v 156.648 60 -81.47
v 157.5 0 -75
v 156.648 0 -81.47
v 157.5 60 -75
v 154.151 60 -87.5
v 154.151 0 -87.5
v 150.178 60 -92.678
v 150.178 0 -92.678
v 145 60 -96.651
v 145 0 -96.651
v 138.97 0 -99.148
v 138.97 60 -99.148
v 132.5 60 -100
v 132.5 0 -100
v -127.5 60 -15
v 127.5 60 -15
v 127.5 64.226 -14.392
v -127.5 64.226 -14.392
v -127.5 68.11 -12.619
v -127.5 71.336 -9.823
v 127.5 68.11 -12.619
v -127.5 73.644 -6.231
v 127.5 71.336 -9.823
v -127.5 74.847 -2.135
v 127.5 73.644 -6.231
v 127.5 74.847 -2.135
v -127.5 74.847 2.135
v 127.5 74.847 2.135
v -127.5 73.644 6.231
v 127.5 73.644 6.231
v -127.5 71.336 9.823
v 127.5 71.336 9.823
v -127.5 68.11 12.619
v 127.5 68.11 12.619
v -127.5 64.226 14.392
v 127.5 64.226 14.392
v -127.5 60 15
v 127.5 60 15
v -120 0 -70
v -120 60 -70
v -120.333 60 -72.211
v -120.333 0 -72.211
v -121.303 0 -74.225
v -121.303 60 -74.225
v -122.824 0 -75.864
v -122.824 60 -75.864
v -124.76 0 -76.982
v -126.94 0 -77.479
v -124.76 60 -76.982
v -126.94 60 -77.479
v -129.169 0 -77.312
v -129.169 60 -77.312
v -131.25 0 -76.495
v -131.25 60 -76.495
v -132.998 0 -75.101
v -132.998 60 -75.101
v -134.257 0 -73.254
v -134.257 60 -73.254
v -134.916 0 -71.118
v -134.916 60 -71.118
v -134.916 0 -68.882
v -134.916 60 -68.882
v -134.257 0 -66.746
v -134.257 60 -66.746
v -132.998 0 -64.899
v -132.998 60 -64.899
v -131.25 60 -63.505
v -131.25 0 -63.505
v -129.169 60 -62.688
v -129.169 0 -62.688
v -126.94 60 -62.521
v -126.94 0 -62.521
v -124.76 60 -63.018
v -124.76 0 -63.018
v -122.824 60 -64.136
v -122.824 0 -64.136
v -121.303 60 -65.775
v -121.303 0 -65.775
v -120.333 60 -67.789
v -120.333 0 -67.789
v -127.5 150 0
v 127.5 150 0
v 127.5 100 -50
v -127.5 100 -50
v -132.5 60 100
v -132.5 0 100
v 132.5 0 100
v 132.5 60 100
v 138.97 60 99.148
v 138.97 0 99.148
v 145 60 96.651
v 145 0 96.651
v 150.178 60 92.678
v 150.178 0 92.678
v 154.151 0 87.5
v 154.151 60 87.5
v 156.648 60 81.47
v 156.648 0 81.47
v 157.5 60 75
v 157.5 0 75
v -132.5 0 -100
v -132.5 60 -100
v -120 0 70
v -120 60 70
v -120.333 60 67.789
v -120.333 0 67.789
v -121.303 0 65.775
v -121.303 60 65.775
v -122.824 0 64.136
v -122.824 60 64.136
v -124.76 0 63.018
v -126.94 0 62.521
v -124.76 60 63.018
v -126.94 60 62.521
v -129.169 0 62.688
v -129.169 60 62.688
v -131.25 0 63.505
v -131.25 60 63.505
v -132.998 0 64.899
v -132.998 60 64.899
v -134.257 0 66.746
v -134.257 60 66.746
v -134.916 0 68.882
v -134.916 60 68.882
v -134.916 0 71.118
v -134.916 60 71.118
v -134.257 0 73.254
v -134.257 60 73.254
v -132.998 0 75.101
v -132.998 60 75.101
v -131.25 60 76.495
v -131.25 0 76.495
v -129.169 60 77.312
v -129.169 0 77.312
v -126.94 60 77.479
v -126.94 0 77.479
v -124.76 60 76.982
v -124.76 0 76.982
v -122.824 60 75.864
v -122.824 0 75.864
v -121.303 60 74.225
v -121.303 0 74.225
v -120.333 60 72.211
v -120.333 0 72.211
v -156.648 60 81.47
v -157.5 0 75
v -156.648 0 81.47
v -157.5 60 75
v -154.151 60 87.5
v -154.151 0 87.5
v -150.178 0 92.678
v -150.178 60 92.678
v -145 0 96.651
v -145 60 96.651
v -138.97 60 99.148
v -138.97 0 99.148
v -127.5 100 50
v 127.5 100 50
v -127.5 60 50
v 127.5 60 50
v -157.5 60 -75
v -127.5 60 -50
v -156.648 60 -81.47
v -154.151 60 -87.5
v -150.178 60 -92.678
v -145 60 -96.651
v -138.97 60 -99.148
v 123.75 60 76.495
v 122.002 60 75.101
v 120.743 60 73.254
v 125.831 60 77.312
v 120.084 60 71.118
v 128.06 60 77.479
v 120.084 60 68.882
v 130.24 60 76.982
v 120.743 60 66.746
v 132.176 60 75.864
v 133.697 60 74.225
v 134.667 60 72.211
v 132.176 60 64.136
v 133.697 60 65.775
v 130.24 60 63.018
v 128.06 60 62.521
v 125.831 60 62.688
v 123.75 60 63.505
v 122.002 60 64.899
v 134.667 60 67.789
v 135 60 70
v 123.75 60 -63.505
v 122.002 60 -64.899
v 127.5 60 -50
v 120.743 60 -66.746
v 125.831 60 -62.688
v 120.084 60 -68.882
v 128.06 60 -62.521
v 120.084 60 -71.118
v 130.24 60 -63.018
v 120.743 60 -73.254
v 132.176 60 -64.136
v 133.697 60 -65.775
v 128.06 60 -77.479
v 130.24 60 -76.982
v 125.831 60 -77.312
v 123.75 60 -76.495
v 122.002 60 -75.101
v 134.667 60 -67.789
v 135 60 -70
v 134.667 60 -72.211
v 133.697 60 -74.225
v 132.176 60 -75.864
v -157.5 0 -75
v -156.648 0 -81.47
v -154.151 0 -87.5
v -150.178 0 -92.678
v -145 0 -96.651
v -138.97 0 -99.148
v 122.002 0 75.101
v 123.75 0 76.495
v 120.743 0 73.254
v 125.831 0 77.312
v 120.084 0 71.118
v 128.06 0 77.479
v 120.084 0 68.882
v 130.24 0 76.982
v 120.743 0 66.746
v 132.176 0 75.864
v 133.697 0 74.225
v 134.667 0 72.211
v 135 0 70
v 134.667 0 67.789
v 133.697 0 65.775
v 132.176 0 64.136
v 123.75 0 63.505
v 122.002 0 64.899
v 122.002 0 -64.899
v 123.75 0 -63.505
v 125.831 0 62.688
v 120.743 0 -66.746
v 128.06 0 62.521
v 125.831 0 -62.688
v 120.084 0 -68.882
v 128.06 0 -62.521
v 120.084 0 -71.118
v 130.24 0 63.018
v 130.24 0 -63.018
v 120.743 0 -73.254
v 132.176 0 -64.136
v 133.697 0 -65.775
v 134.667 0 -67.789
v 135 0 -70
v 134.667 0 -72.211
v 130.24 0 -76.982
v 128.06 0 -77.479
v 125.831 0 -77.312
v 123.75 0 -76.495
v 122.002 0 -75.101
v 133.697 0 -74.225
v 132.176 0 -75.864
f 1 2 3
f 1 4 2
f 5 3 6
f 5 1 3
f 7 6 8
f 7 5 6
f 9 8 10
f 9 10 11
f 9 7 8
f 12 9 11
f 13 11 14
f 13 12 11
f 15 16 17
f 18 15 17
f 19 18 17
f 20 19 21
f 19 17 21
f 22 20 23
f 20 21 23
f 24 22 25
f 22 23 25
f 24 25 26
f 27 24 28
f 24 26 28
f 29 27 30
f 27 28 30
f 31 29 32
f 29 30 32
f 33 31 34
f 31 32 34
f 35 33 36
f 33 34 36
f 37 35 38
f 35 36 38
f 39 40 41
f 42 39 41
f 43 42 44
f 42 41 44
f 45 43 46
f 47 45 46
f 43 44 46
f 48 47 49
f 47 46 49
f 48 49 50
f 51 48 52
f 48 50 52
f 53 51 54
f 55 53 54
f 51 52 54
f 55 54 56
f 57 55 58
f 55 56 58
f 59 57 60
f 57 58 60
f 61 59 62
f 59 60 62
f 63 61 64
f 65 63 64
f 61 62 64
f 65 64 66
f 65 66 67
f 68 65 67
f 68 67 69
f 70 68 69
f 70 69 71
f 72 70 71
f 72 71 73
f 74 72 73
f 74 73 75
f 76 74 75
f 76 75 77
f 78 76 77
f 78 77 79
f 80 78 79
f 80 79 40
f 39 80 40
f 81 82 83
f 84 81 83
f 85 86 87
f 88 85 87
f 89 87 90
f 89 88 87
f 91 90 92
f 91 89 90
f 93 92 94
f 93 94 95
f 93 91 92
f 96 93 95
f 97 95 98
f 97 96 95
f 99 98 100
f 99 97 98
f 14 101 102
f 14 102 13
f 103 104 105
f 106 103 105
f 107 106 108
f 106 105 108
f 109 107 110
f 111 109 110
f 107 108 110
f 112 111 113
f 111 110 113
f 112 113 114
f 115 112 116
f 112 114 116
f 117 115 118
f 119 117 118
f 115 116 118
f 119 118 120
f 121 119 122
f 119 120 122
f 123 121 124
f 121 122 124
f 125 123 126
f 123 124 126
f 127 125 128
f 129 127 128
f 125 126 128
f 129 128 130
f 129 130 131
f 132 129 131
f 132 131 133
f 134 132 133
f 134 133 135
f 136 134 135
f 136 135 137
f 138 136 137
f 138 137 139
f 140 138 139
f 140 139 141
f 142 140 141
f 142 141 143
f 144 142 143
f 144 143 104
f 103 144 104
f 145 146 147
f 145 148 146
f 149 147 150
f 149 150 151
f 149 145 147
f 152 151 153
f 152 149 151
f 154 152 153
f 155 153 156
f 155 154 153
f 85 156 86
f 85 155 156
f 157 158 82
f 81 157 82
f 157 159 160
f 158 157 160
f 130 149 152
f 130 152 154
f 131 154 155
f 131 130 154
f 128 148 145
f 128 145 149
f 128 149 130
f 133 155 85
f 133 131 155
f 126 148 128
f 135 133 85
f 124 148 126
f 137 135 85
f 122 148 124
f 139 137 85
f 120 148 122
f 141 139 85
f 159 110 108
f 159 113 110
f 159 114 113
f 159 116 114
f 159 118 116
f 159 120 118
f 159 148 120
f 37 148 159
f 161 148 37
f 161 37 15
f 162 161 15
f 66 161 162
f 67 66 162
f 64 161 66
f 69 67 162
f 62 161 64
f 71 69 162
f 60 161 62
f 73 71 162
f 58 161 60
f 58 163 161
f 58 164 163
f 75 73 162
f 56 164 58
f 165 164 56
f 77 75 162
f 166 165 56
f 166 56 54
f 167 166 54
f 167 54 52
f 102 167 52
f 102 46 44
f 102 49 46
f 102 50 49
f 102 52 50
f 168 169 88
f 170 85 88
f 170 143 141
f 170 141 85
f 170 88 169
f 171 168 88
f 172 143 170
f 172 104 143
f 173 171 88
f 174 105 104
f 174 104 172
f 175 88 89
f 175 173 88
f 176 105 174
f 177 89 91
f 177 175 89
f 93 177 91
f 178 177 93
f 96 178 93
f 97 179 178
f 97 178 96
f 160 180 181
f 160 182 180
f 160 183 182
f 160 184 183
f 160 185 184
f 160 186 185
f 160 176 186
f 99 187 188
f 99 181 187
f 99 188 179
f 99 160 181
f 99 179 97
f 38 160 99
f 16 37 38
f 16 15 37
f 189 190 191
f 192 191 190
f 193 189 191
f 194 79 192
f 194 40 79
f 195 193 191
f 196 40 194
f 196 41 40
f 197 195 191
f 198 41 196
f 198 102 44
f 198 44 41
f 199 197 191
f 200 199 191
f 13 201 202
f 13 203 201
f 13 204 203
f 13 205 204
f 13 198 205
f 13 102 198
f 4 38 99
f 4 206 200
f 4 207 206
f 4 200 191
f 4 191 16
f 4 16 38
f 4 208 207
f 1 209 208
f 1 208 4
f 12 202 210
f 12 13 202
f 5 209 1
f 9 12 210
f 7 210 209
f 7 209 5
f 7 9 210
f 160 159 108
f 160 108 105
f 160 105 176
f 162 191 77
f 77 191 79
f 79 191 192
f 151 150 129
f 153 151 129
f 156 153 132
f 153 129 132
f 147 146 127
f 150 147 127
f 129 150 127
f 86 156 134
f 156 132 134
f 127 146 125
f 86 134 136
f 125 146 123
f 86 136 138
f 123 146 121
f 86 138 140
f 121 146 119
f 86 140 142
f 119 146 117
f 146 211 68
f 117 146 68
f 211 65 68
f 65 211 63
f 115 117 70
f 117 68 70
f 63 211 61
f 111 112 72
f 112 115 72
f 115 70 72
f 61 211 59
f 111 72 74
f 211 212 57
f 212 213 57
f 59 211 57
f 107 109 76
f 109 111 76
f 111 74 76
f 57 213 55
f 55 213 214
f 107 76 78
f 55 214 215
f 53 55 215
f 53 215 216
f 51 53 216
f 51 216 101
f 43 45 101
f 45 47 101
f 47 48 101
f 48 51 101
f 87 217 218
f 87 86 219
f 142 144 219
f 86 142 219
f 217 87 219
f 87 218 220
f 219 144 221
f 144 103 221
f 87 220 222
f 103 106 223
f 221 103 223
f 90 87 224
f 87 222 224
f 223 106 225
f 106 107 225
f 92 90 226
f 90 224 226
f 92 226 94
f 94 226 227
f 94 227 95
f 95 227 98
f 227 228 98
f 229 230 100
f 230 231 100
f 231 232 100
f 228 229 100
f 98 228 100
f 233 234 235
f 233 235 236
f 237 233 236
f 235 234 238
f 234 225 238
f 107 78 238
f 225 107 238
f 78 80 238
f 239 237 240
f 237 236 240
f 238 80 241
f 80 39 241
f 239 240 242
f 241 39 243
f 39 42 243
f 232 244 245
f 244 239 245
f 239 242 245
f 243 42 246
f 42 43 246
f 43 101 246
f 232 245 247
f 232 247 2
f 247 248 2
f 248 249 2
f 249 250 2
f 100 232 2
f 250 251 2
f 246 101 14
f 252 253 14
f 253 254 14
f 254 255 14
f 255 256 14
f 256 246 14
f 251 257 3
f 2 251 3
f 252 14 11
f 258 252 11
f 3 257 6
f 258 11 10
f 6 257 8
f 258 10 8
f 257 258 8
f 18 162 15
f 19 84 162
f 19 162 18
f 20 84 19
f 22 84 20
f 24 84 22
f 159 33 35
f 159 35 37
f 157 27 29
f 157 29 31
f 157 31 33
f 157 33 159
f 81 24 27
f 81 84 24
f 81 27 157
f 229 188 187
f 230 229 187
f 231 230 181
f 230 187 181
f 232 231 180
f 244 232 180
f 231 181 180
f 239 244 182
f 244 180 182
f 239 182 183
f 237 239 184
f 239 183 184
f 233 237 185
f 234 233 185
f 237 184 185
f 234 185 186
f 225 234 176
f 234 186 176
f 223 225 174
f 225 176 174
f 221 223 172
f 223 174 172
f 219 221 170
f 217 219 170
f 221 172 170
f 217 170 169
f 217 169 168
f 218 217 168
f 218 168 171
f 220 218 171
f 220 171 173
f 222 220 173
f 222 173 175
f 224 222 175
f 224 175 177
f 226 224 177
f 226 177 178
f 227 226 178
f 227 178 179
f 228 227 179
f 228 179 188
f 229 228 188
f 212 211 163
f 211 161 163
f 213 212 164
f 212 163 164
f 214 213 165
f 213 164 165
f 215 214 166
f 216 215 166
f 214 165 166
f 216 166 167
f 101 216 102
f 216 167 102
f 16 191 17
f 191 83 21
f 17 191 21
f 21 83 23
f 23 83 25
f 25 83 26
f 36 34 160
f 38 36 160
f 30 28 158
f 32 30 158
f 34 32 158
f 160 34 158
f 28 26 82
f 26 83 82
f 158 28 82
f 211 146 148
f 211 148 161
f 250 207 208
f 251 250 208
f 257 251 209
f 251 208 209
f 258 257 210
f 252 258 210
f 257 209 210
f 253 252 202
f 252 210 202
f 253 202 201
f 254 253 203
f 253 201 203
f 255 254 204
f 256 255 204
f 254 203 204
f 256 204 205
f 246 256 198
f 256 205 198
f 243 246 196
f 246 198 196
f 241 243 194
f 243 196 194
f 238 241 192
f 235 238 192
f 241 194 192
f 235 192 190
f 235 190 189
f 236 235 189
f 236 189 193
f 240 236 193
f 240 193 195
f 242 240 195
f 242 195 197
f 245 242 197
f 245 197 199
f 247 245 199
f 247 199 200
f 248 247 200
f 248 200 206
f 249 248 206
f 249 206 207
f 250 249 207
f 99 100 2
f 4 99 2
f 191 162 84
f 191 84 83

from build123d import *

# Parameters (mm, degrees)
IZIM1_W                     = 315
IZIM1_H                     = 200
Y_KSEKLIK_EKSTR_ZYON1_DEPTH = 60
RADYUS1_R                   = 25
IZIM2_R                     = 7.5
KES_EKSTR_ZYON1_DEPTH       = 61
IZIM3_W                     = 255
IZIM3_H                     = 100
Y_KSEKLIK_EKSTR_ZYON2_DEPTH = 40
Y_KSEKLIK_EKSTR_ZYON3_DEPTH = 255
KES_EKSTR_ZYON2_DEPTH       = 286


with BuildPart() as part:
    # Çizim1 → Yükseklik-Ekstrüzyon1 (new body)
    with BuildSketch(Plane(origin=(0, 0, 0), x_dir=(1, 0, 0), z_dir=(0, 1, 0))):
        Rectangle(IZIM1_W, IZIM1_H)
    extrude(amount=Y_KSEKLIK_EKSTR_ZYON1_DEPTH)

    # Radyus1
    radyus1_edges = [part.edges().sort_by_distance(p)[0] for p in [
        (157.5, 30, 100),
        (-157.5, 30, 100),
        (-157.5, 30, -100),
        (157.5, 30, -100),
    ]]
    fillet(radyus1_edges, radius=RADYUS1_R)

    # Çizim2 → Kes-Ekstrüzyon1 (cut, through all)
    with BuildSketch(Plane(origin=(0, 60, 0), x_dir=(1, 0, 0), z_dir=(0, 1, 0))):
        with Locations((-127.5, 70)):
            Circle(IZIM2_R)
        with Locations((127.5, 70)):
            Circle(IZIM2_R)
        with Locations((127.5, -70)):
            Circle(IZIM2_R)
        with Locations((-127.5, -70)):
            Circle(IZIM2_R)
    extrude(amount=-KES_EKSTR_ZYON1_DEPTH, mode=Mode.SUBTRACT)

    # Çizim3 → Yükseklik-Ekstrüzyon2 (add)
    with BuildSketch(Plane(origin=(0, 60, 0), x_dir=(1, 0, 0), z_dir=(0, 1, 0))):
        Rectangle(IZIM3_W, IZIM3_H)
    extrude(amount=Y_KSEKLIK_EKSTR_ZYON2_DEPTH)

    # Çizim4 → Yükseklik-Ekstrüzyon3 (add)
    with BuildSketch(Plane(origin=(127.5, 0, 0), x_dir=(0, 0, -1), z_dir=(1, 0, 0))):
        Polygon((-50, 100), (0, 150), (50, 100), align=None)
    extrude(amount=-Y_KSEKLIK_EKSTR_ZYON3_DEPTH)

    # Çizim5 → Kes-Ekstrüzyon2 (cut, through all)
    with BuildSketch(Plane(origin=(127.5, 0, 0), x_dir=(0, 0, -1), z_dir=(1, 0, 0))):
        with BuildLine():
            Line((-15, 60), (15, 60))
            ThreePointArc((15, 60), (0, 75), (-15, 60))
        make_face()
    extrude(amount=-KES_EKSTR_ZYON2_DEPTH, mode=Mode.SUBTRACT)


solid = part.part
